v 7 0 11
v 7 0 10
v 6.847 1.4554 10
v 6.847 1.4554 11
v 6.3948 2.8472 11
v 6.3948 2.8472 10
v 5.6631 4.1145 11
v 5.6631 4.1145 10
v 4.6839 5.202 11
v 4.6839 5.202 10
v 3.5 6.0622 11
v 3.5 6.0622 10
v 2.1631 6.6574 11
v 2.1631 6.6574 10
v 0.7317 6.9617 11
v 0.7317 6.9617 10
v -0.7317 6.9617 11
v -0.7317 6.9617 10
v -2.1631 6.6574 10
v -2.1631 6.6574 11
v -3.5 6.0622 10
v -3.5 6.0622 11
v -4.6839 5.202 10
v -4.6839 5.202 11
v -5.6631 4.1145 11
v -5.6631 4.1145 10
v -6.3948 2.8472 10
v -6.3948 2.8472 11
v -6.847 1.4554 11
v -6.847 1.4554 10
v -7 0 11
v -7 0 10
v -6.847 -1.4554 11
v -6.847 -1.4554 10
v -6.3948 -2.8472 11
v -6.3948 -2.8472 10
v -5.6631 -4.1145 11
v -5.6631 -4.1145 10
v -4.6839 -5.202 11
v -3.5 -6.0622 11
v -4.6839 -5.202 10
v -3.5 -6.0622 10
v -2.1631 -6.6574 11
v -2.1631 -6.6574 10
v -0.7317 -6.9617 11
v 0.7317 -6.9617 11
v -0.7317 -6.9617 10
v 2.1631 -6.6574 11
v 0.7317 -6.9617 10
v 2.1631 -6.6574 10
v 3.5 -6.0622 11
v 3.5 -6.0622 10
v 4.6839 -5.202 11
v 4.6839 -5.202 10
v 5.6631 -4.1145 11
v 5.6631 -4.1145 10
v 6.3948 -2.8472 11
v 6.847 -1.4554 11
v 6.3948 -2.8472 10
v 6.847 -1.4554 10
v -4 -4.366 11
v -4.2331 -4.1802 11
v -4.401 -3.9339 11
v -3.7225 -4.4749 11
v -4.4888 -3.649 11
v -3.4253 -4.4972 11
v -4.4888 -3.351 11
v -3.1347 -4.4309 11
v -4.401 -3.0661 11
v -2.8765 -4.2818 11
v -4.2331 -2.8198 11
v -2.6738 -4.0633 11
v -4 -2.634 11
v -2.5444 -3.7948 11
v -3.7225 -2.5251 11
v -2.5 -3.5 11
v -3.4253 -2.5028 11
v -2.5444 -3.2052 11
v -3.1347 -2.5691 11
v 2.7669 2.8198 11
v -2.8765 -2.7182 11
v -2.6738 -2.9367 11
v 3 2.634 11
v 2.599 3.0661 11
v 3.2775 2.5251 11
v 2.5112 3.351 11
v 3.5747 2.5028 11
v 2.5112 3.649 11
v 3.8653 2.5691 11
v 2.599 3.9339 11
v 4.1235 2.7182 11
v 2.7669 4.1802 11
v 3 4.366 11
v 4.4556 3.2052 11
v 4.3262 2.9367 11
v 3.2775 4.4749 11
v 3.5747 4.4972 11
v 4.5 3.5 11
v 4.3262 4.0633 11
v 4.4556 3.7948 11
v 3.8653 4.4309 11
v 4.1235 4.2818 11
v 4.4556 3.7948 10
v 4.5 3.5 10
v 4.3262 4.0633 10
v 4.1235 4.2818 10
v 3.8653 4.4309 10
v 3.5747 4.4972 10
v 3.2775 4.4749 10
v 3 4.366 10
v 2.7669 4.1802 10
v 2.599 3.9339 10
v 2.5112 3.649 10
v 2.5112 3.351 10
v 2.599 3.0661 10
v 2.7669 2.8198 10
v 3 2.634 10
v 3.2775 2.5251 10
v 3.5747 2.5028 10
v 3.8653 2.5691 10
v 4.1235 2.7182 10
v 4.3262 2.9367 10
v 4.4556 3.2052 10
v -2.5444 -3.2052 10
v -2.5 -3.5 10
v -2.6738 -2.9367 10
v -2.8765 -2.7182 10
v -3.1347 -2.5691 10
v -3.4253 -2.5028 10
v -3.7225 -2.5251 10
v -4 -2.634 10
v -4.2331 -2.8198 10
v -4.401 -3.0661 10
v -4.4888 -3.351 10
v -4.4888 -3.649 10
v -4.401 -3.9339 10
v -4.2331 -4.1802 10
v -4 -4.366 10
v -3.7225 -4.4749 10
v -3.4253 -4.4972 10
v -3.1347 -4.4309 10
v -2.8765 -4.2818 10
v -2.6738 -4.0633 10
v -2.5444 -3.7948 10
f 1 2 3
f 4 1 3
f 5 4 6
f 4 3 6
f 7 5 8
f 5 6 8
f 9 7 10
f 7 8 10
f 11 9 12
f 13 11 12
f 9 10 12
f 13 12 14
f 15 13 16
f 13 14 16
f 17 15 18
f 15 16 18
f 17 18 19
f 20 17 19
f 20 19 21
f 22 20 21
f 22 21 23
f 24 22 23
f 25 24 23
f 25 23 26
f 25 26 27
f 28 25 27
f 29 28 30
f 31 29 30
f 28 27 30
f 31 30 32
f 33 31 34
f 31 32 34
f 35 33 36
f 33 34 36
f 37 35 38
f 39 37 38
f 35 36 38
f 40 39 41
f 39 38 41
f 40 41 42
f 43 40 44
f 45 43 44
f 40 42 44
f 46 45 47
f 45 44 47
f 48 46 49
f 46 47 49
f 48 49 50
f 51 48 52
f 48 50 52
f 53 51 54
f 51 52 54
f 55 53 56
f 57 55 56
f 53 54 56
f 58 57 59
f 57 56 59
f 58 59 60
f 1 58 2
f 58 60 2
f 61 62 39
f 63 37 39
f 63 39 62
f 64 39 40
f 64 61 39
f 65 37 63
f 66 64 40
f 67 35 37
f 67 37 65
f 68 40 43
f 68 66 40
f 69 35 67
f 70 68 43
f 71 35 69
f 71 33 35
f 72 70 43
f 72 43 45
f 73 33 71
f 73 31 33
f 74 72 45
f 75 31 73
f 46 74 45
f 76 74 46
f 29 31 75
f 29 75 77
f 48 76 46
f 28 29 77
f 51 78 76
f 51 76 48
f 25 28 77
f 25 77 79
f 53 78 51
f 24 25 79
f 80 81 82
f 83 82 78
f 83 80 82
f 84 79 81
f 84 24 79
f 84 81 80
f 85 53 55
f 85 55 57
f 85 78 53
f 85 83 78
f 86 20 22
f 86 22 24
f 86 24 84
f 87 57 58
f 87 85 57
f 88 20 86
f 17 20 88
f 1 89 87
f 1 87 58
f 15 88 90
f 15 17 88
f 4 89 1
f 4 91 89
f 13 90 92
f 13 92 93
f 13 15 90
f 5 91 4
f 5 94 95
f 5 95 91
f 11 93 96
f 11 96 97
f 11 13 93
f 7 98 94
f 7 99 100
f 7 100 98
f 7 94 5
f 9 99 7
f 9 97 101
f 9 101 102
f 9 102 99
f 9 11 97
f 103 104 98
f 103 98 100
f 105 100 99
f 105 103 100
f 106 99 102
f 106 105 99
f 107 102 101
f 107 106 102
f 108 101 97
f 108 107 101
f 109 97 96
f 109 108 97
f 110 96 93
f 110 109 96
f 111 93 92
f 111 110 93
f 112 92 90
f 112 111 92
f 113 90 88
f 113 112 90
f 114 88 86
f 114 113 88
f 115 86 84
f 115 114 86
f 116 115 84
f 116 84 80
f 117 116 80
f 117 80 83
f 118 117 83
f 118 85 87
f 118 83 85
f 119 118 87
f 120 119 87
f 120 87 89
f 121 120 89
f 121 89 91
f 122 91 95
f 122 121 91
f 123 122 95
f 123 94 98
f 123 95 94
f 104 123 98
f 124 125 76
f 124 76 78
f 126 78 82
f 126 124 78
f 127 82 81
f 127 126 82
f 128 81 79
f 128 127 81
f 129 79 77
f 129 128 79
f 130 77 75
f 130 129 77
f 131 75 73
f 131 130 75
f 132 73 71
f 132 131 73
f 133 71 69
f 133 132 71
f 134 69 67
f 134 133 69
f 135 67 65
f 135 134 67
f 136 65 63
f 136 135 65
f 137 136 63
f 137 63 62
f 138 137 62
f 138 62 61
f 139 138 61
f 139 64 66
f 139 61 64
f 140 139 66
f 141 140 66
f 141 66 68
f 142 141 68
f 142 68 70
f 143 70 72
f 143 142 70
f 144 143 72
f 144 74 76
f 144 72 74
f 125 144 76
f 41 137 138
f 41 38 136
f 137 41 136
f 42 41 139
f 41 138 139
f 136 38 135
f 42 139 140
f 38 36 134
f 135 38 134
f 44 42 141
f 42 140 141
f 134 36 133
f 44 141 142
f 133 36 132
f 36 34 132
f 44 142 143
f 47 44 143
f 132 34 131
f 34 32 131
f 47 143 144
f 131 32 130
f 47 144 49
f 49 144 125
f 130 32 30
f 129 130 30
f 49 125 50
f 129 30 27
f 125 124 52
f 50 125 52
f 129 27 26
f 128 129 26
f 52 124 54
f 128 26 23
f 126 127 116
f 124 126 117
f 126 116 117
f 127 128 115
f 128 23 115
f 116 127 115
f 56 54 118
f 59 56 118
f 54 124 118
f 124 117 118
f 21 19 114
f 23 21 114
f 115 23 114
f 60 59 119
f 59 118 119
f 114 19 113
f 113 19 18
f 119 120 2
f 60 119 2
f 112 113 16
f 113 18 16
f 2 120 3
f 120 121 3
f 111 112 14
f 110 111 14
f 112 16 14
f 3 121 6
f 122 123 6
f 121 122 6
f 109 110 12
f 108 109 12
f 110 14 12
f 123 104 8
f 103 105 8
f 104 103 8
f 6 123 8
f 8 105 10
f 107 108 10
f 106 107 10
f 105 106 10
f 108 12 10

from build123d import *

# Parameters (mm, degrees)
CYLINDER064_R     = 1
CYLINDER064_DEPTH = 20
CYLINDER065_R     = 1
CYLINDER065_DEPTH = 20
CYLINDER066_R     = 7
CYLINDER066_DEPTH = 1


with BuildPart() as v_lec064:
    # Cylinder064 → Cylinder064 (new body)
    with BuildSketch(Plane(origin=(-3.5, -3.5, 0), x_dir=(1, 0, 0), z_dir=(0, 0, 1))):
        Circle(CYLINDER064_R)
    extrude(amount=CYLINDER064_DEPTH)


with BuildPart() as compound035:
    # Cylinder065 → Cylinder065 (new body)
    with BuildSketch(Plane(origin=(3.5, 3.5, 0), x_dir=(1, 0, 0), z_dir=(0, 0, 1))):
        Circle(CYLINDER065_R)
    extrude(amount=CYLINDER065_DEPTH)

    # Compound035: union Válec064
    add(v_lec064.part)


with BuildPart() as cut035:
    # Cylinder066 → Cylinder066 (new body)
    with BuildSketch(Plane.XY.offset(10)):
        Circle(CYLINDER066_R)
    extrude(amount=CYLINDER066_DEPTH)

    # Cut035: cut Compound035
    add(compound035.part, mode=Mode.SUBTRACT)


solid = cut035.part
